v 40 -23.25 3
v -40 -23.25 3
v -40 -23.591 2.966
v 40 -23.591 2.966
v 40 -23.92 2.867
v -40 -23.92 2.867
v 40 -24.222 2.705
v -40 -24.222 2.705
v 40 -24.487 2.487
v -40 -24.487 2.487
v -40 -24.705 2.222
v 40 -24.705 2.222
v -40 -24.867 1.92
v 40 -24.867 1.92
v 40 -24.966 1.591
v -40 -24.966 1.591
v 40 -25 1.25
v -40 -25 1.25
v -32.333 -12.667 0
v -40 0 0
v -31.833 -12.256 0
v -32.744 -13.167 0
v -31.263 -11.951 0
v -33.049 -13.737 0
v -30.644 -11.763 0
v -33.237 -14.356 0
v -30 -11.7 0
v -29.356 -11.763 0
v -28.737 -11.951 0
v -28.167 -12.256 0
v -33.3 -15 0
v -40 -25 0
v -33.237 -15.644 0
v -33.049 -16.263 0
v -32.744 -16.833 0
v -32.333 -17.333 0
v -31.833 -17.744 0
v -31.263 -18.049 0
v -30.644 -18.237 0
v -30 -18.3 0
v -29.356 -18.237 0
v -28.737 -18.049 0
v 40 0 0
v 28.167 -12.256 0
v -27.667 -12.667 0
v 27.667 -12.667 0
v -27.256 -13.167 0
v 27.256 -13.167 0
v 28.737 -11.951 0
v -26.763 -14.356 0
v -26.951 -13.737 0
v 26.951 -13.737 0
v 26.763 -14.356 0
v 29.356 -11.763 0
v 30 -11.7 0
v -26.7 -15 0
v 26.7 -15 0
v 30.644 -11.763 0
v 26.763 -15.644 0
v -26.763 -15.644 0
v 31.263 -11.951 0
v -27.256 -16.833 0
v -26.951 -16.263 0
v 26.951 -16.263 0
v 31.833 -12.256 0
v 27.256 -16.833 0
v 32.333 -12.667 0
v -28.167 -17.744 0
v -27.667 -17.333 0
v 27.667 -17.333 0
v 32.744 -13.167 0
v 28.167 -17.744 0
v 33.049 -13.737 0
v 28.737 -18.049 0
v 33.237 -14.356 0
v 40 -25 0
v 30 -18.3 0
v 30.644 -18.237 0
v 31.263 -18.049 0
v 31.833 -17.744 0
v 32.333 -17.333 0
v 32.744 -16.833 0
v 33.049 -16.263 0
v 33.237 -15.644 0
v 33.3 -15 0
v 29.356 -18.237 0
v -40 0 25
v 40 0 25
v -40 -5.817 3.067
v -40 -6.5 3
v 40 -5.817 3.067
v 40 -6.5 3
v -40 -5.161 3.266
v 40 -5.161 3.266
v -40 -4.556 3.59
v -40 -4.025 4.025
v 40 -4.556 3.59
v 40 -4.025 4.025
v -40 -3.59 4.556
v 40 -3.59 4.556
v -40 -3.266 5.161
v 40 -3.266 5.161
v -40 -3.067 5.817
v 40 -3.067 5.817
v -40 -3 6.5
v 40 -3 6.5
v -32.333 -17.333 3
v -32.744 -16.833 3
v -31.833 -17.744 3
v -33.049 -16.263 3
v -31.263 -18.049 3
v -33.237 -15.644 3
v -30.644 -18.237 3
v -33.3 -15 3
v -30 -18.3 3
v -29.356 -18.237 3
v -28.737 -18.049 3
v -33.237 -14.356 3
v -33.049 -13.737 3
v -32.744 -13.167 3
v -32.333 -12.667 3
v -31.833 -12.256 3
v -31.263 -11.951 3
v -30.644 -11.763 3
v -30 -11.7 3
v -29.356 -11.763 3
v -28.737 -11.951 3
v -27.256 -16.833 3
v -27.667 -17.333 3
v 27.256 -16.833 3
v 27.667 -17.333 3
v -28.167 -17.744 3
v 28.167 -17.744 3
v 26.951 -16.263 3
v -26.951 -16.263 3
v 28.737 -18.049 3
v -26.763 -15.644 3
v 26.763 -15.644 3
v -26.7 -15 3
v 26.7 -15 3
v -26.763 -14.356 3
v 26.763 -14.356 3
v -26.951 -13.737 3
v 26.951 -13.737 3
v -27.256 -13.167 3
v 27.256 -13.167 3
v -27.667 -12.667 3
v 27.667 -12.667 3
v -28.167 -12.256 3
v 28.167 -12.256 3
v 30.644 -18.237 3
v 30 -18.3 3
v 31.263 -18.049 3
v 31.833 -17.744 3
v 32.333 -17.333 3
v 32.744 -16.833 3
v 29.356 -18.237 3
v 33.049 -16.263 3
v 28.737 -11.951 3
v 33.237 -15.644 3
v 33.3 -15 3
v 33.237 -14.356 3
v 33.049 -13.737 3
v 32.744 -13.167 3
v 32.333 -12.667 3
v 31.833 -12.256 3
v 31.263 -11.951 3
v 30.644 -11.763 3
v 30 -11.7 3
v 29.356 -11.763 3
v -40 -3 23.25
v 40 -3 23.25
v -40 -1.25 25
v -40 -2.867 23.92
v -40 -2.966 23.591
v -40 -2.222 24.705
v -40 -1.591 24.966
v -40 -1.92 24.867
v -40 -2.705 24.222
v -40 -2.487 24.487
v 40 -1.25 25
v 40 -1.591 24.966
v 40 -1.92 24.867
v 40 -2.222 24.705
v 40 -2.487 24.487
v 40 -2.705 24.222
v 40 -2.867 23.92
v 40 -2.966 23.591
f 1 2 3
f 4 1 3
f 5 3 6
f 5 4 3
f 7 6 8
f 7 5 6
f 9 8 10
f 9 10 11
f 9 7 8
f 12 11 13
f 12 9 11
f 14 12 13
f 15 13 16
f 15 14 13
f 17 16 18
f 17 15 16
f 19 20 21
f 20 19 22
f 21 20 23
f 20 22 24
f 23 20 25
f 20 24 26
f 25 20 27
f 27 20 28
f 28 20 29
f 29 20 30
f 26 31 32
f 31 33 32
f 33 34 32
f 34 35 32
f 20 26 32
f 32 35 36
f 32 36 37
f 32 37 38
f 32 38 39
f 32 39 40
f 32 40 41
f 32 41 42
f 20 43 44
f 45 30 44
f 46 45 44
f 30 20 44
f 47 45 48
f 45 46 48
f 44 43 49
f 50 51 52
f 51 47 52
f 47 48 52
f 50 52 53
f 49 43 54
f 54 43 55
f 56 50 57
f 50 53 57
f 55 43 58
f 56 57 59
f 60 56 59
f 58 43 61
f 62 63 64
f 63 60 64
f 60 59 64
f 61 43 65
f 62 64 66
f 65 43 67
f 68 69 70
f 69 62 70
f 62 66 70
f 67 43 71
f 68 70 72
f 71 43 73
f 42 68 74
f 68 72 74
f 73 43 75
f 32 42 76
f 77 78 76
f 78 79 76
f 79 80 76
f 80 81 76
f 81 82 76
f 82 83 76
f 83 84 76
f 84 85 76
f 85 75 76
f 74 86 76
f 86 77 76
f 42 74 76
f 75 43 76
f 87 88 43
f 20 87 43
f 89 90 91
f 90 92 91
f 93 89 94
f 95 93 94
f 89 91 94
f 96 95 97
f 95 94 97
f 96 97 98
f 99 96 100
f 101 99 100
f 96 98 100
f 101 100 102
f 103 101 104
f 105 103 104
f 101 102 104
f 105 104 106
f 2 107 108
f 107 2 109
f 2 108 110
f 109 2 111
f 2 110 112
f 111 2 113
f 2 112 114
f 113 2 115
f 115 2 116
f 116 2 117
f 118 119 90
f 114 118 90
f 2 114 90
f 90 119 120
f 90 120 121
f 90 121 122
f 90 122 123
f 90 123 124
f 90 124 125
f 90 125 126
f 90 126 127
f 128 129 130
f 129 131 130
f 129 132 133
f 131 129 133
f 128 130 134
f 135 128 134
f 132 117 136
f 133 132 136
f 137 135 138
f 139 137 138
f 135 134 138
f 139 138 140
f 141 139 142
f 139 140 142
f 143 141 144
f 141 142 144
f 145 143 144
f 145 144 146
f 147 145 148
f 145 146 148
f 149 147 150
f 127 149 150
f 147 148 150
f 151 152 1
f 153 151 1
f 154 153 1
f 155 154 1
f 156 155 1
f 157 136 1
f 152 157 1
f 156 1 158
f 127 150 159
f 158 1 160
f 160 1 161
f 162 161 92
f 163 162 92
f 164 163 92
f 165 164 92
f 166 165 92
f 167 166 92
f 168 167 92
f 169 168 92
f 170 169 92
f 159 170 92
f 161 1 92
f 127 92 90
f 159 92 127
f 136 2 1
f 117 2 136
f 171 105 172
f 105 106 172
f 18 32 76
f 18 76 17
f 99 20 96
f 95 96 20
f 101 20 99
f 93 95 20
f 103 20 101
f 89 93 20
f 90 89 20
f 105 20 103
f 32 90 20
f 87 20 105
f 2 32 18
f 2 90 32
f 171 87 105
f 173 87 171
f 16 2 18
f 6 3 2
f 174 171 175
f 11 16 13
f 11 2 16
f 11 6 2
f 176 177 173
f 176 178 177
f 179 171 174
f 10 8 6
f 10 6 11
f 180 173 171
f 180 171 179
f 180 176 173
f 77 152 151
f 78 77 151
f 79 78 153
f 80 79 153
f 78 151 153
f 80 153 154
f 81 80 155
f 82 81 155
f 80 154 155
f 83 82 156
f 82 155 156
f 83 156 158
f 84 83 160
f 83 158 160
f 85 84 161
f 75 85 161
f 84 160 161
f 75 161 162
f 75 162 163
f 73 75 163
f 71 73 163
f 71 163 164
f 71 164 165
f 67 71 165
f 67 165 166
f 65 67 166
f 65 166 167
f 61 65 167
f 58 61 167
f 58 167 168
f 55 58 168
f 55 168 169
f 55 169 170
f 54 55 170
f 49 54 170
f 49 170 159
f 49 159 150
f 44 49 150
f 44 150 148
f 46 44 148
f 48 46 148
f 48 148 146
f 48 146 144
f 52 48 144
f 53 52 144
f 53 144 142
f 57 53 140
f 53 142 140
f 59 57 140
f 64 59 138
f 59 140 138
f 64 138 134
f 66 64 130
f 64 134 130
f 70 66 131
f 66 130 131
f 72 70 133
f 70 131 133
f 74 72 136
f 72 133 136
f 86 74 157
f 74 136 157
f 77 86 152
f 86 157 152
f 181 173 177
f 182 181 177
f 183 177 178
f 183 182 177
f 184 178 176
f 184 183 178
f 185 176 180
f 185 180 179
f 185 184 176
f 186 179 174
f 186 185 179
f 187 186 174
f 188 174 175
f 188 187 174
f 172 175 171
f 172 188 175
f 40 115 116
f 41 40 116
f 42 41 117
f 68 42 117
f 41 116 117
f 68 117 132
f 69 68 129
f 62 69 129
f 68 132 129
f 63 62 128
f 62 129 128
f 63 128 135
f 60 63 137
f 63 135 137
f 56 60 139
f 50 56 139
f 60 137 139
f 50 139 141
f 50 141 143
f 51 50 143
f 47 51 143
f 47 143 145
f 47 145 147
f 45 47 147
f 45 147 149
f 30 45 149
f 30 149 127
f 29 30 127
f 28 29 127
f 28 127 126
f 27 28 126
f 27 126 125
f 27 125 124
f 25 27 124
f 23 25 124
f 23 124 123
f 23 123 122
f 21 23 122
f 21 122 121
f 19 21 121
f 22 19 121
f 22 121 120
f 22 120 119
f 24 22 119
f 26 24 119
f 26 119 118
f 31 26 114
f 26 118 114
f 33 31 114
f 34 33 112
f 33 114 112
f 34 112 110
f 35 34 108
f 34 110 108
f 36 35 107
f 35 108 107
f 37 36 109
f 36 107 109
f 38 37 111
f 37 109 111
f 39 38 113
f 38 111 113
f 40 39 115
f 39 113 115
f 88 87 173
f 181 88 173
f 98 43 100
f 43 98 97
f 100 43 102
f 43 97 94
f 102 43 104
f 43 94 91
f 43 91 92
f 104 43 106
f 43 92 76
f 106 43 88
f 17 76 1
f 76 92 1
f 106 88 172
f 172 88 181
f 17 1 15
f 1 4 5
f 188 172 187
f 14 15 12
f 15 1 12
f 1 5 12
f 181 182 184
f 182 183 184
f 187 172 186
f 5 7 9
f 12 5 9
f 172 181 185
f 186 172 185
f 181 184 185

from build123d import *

# Parameters (mm, degrees)
PAD_DEPTH   = 40
SKETCH001_R = 3.3
HOLE_DEPTH  = 3.001


with BuildPart() as part:
    # Sketch → Pad (new body, symmetric)
    with BuildSketch(Plane.YZ):
        with BuildLine():
            Line((0, 25), (0, 0))
            Line((0, 0), (-25, 0))
            Line((-25, 0), (-25, 1.25))
            ThreePointArc((-23.25, 3), (-24.487437, 2.487437), (-25, 1.25))
            Line((-23.25, 3), (-6.5, 3))
            ThreePointArc((-6.5, 3), (-4.025126, 4.025126), (-3, 6.5))
            Line((-3, 6.5), (-3, 23.25))
            ThreePointArc((-1.25, 25), (-2.487437, 24.487437), (-3, 23.25))
            Line((0, 25), (-1.25, 25))
        make_face()
    extrude(amount=PAD_DEPTH, both=True)

    # Sketch001 (on Face6 of Pad) → Hole (cut, through all)
    with BuildSketch(Plane(origin=(0, 0, 3), x_dir=(0, -1, 0), z_dir=(0, 0, 1))):
        with Locations((15, 30)):
            Circle(SKETCH001_R)
        with Locations((15, -30)):
            Circle(SKETCH001_R)
    extrude(amount=-HOLE_DEPTH, mode=Mode.SUBTRACT)


solid = part.part
